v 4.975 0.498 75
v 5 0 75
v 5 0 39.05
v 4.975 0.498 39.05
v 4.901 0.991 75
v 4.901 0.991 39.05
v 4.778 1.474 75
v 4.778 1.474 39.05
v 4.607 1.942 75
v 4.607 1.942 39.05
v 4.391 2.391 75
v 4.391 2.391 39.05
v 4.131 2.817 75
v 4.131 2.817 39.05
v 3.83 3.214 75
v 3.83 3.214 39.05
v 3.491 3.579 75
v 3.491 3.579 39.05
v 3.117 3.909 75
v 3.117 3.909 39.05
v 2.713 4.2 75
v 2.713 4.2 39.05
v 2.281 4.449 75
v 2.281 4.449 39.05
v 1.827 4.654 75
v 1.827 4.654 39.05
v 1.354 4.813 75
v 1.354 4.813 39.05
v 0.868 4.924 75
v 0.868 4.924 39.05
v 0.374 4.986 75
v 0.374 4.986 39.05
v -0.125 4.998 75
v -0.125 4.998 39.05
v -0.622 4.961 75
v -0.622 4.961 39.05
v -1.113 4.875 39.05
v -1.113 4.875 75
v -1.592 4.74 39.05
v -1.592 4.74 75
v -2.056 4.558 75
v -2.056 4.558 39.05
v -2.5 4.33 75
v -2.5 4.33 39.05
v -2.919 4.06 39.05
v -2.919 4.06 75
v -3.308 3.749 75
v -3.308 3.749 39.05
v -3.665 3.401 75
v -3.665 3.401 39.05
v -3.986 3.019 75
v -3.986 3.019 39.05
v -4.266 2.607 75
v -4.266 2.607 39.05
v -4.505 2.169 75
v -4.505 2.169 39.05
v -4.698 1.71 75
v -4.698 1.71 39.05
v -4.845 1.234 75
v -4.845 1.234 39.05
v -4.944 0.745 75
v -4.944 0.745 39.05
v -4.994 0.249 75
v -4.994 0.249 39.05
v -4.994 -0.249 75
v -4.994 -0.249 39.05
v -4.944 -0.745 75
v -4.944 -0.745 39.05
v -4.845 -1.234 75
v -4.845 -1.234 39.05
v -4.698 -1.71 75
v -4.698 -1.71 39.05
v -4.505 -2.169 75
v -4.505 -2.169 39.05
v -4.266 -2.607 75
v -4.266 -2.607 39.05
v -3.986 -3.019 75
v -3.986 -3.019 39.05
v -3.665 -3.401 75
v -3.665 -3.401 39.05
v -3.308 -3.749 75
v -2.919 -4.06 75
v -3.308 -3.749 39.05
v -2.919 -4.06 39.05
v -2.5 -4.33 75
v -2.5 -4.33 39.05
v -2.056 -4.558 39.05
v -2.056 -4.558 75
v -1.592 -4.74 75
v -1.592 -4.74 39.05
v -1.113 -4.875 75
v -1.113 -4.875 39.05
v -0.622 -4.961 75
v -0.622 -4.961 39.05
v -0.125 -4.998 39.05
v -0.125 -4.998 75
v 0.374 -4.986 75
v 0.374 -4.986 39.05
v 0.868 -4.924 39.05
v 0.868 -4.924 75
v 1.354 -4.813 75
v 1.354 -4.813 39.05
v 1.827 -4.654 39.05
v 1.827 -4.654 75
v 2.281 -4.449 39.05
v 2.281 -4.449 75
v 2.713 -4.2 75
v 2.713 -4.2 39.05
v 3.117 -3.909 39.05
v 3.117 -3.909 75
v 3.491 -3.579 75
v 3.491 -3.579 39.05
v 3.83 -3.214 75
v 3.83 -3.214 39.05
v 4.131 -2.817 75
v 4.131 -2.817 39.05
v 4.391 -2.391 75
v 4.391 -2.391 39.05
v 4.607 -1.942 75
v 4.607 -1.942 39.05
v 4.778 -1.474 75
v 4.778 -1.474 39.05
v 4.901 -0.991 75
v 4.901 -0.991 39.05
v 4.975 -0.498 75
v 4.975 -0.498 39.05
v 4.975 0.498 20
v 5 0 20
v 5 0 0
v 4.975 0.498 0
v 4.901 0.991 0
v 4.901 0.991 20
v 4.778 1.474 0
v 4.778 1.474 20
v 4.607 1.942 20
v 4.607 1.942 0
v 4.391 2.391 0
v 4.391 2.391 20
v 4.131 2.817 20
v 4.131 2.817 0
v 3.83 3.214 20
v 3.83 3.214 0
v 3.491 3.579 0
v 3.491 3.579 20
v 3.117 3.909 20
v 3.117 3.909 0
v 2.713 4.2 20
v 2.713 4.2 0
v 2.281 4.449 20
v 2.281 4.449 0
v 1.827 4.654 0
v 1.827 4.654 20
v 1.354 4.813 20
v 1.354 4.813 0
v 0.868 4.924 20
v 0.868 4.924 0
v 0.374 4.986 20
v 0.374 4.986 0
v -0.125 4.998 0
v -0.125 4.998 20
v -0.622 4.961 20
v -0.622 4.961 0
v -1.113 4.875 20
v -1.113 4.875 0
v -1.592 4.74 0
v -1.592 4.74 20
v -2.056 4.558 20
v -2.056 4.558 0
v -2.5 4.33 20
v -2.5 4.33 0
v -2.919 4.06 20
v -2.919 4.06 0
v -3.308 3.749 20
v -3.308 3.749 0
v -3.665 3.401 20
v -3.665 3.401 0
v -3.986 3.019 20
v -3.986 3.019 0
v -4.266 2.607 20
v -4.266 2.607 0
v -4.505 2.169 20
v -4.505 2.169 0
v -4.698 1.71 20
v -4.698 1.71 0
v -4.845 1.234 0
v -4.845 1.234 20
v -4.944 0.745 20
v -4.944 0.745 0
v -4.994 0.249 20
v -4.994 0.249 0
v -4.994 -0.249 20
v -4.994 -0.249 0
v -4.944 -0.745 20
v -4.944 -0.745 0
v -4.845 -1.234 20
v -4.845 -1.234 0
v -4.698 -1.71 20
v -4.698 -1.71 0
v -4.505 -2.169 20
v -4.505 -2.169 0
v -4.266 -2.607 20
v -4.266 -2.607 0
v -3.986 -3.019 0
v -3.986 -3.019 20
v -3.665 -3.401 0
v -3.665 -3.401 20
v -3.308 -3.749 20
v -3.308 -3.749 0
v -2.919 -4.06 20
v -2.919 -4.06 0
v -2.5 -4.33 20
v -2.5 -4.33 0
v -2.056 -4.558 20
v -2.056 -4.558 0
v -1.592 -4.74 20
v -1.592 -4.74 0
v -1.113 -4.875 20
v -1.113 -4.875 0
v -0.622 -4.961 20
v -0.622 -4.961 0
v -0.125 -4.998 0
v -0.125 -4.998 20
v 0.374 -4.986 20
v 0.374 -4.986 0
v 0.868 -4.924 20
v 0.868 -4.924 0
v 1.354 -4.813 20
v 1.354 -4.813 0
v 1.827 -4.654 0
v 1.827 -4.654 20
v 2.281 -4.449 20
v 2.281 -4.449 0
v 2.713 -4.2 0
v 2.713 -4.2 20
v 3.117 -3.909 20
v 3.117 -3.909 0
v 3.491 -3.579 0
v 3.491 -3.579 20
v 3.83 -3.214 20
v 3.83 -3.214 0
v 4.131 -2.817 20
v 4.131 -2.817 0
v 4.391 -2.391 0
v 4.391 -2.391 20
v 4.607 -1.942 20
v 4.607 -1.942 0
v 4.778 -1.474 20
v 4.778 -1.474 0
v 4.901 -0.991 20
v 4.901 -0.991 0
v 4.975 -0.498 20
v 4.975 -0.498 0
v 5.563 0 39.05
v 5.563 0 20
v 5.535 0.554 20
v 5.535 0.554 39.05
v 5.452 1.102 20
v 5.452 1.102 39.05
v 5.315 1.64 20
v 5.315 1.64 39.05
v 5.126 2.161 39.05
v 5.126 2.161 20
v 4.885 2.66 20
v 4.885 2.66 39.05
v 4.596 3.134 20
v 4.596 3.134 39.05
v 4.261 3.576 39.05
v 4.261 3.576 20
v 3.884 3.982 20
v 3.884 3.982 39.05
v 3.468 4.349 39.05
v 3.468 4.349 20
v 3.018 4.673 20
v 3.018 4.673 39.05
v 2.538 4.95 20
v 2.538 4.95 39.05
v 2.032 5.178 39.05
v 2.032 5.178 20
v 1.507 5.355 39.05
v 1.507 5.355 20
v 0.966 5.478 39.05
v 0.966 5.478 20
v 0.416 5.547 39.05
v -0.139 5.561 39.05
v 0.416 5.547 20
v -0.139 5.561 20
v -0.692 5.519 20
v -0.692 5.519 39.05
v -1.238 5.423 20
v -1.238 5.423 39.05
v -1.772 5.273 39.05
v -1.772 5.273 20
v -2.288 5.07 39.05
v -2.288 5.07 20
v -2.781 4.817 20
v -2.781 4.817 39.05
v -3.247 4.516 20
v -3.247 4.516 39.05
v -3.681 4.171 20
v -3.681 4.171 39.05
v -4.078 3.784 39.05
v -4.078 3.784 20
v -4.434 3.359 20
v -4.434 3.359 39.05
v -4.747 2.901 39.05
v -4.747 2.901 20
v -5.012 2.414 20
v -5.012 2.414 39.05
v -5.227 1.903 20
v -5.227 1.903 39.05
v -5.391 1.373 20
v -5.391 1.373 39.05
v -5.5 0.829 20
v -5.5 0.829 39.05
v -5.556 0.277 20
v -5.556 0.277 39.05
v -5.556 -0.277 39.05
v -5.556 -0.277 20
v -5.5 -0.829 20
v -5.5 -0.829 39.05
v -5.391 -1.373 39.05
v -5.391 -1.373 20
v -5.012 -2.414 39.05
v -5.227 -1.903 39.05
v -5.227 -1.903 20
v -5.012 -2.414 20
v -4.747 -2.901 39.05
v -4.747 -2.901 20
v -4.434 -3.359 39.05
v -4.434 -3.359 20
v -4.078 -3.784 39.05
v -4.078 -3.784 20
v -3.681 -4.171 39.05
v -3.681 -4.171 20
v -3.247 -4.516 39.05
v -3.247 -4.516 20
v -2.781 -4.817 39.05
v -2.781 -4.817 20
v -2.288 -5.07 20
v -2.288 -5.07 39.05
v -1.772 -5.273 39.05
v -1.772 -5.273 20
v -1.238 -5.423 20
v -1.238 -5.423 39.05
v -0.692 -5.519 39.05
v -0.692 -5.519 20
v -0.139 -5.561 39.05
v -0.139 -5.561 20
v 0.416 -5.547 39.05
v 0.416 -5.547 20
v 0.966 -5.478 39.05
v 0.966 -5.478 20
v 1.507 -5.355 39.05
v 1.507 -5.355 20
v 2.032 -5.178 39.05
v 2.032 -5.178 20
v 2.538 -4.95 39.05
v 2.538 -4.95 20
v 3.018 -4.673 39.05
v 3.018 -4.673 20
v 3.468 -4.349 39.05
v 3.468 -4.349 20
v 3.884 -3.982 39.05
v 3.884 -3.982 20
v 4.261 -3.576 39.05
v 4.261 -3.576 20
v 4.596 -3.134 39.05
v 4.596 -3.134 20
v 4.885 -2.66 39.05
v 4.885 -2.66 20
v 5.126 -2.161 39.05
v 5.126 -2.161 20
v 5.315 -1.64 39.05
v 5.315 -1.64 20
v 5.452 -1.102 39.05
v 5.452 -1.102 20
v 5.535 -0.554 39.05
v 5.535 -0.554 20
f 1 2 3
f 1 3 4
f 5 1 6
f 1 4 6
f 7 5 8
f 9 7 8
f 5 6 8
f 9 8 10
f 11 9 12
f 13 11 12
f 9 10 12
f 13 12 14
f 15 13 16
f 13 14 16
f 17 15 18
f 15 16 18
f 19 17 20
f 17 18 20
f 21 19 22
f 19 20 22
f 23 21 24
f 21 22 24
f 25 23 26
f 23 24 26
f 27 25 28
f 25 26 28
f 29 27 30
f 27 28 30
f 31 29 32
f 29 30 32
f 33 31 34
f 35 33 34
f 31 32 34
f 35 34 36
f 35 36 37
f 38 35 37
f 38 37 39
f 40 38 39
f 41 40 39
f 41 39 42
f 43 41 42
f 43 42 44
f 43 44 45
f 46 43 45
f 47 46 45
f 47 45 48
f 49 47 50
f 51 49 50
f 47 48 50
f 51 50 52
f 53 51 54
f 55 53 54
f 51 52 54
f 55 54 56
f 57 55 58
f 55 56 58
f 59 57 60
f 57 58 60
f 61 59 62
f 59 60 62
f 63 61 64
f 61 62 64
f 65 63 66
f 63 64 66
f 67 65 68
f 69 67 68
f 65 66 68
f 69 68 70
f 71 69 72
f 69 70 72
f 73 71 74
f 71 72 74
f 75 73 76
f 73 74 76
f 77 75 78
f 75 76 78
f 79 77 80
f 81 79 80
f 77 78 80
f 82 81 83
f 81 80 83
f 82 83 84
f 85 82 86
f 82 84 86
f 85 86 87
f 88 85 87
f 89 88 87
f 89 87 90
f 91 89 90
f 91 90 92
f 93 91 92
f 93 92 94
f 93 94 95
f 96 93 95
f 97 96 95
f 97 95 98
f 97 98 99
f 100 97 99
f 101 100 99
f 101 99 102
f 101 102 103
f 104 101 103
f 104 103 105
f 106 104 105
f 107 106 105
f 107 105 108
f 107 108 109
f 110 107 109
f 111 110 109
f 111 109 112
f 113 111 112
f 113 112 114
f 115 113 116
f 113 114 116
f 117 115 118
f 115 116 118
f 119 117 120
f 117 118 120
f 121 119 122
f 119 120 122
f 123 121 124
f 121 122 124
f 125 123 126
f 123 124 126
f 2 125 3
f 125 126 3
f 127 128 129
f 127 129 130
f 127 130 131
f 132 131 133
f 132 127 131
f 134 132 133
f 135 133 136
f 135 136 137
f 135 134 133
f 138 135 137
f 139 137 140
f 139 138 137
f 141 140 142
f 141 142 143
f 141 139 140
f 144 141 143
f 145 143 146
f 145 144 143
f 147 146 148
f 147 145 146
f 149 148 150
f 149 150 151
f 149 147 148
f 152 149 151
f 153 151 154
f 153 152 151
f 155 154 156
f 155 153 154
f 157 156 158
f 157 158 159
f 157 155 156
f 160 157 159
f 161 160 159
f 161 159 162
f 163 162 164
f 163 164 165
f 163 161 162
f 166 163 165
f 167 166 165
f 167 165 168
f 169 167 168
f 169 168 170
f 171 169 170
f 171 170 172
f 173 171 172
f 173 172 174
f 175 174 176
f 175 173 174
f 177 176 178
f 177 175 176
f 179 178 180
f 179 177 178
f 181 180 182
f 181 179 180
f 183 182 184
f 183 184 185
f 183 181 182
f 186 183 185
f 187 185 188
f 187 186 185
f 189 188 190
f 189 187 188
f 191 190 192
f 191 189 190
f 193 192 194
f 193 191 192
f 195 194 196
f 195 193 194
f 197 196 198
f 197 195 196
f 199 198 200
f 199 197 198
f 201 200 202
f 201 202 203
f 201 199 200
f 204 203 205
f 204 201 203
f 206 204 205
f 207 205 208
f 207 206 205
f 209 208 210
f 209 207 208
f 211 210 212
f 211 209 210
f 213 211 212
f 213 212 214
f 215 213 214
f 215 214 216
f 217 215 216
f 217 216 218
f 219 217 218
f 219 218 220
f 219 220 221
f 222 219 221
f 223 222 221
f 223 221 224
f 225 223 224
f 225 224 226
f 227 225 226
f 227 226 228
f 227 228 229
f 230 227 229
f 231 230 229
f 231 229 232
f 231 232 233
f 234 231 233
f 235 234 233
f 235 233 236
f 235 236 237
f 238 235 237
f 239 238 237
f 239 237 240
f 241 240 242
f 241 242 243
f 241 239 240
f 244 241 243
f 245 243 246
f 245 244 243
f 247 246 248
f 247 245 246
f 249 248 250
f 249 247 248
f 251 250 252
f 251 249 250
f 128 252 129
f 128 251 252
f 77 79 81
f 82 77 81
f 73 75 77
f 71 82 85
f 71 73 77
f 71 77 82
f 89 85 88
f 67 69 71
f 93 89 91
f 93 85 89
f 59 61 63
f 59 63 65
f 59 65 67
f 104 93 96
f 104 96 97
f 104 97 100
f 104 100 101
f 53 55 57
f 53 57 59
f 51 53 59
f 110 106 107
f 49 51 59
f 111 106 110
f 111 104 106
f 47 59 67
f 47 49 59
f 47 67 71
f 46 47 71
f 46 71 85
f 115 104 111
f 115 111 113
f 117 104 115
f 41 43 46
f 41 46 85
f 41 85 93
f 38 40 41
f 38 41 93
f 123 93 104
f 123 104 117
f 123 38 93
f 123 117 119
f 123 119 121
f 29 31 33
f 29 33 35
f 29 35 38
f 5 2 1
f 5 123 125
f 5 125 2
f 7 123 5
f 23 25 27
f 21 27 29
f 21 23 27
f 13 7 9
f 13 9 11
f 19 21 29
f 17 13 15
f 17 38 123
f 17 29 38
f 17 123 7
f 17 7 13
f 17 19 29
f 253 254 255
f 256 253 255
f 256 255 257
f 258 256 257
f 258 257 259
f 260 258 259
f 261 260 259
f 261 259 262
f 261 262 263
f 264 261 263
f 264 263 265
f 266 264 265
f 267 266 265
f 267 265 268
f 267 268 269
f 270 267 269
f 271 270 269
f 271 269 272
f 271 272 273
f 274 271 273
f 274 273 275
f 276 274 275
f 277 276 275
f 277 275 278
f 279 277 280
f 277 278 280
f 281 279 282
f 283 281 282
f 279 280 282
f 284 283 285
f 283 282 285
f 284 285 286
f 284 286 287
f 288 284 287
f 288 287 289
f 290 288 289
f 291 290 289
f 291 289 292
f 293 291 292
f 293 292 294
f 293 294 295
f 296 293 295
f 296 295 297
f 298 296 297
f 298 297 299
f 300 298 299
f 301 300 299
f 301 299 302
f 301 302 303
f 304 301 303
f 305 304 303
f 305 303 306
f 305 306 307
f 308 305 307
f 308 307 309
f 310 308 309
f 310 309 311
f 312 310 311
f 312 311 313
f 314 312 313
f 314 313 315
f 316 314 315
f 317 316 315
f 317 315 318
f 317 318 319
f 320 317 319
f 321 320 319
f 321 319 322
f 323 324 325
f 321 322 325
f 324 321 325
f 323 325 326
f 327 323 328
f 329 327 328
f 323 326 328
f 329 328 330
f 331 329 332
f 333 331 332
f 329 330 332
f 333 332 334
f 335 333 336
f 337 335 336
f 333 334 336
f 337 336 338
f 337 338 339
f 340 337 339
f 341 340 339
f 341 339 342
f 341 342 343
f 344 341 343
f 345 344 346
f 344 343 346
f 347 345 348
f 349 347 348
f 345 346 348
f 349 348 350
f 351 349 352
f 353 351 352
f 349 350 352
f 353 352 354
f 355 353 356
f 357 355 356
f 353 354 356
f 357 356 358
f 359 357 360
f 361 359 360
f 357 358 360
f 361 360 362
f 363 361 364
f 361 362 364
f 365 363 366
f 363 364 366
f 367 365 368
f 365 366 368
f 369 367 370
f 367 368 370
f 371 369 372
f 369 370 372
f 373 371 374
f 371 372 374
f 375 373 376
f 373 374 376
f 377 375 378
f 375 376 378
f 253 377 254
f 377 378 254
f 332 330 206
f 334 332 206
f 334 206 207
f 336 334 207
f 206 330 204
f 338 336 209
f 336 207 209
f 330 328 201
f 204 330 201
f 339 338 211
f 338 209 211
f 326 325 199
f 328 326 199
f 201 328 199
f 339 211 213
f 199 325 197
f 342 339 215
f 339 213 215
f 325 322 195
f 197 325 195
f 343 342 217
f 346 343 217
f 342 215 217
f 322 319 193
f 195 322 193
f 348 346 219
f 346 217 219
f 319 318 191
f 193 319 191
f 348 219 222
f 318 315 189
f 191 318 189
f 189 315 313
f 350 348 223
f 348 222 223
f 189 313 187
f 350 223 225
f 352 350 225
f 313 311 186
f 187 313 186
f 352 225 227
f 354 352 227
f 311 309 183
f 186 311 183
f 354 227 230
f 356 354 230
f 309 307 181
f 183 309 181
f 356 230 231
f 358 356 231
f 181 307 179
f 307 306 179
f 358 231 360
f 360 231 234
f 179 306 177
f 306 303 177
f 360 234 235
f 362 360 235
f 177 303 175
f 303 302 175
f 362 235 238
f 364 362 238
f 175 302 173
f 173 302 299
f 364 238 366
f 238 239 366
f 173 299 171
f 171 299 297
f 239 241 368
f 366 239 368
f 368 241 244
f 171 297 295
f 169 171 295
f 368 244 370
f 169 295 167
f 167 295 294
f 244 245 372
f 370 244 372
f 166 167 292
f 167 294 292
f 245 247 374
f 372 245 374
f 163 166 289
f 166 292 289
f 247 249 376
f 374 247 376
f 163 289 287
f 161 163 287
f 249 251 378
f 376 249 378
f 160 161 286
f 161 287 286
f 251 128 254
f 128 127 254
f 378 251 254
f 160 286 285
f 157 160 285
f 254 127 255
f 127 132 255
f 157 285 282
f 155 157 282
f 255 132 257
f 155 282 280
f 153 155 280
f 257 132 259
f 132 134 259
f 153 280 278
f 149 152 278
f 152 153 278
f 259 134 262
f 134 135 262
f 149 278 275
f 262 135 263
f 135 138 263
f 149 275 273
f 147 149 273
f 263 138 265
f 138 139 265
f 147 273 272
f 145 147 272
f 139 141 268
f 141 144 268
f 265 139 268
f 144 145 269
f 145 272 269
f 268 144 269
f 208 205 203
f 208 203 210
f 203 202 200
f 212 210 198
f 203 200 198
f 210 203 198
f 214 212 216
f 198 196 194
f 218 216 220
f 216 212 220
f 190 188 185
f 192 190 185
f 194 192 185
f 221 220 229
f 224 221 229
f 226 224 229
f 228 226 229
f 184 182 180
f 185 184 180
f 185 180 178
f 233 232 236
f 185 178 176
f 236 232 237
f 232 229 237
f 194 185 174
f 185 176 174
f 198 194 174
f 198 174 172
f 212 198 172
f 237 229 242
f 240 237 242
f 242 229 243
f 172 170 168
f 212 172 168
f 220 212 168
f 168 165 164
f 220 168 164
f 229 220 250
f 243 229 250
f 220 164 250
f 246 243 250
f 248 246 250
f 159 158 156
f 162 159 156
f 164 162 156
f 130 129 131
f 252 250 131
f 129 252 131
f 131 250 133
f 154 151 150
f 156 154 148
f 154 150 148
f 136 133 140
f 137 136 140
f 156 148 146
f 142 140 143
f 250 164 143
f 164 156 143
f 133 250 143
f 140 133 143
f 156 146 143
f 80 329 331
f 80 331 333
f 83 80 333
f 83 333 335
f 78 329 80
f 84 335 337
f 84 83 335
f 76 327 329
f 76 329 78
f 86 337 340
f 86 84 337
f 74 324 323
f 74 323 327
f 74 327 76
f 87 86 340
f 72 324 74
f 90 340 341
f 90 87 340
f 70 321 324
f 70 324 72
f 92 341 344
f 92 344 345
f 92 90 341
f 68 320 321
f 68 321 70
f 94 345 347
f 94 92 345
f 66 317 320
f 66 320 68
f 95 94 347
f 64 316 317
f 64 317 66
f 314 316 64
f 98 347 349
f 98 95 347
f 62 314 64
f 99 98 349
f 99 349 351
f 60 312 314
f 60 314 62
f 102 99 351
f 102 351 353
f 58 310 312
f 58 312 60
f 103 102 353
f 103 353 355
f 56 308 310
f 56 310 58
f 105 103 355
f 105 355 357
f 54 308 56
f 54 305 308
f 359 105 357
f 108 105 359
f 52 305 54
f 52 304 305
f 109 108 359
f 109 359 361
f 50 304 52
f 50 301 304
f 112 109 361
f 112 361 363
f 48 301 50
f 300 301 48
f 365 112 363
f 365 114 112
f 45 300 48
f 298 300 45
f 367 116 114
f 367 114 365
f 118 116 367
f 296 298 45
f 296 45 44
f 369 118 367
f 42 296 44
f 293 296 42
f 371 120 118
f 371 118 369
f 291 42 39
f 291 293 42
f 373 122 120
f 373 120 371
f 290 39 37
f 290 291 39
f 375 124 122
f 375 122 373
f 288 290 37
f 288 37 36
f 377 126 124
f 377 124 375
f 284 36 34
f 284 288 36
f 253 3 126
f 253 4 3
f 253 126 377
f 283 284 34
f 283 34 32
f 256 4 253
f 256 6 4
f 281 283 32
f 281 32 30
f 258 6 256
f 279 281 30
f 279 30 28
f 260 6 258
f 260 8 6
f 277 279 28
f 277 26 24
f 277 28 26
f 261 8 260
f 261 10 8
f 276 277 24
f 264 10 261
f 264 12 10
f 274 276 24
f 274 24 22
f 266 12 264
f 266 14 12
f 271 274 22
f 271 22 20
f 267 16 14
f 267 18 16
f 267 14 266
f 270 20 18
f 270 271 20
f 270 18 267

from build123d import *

# Parameters (mm, degrees)
SKETCH1_R           = 5.5626
BOSS_EXTRUDE1_DEPTH = 75
SKETCH5_R           = 5.5626
SKETCH5_R_2         = 5
CUT_EXTRUDE2_DEPTH  = 20
SKETCH6_R           = 5.5626
SKETCH6_R_2         = 5
CUT_EXTRUDE3_DEPTH  = 35.95


with BuildPart() as part:
    # Sketch1 → Boss-Extrude1 (new body)
    with BuildSketch(Plane.XY):
        Circle(SKETCH1_R)
    extrude(amount=BOSS_EXTRUDE1_DEPTH)

    # Sketch5 → Cut-Extrude2 (cut)
    with BuildSketch(Plane.XY.offset(20)):
        Circle(SKETCH5_R)
        Circle(SKETCH5_R_2, mode=Mode.SUBTRACT)
    extrude(amount=-CUT_EXTRUDE2_DEPTH, mode=Mode.SUBTRACT)

    # Sketch6 → Cut-Extrude3 (cut)
    with BuildSketch(Plane.XY.offset(39.05)):
        Circle(SKETCH6_R)
        Circle(SKETCH6_R_2, mode=Mode.SUBTRACT)
    extrude(amount=CUT_EXTRUDE3_DEPTH, mode=Mode.SUBTRACT)


solid = part.part
